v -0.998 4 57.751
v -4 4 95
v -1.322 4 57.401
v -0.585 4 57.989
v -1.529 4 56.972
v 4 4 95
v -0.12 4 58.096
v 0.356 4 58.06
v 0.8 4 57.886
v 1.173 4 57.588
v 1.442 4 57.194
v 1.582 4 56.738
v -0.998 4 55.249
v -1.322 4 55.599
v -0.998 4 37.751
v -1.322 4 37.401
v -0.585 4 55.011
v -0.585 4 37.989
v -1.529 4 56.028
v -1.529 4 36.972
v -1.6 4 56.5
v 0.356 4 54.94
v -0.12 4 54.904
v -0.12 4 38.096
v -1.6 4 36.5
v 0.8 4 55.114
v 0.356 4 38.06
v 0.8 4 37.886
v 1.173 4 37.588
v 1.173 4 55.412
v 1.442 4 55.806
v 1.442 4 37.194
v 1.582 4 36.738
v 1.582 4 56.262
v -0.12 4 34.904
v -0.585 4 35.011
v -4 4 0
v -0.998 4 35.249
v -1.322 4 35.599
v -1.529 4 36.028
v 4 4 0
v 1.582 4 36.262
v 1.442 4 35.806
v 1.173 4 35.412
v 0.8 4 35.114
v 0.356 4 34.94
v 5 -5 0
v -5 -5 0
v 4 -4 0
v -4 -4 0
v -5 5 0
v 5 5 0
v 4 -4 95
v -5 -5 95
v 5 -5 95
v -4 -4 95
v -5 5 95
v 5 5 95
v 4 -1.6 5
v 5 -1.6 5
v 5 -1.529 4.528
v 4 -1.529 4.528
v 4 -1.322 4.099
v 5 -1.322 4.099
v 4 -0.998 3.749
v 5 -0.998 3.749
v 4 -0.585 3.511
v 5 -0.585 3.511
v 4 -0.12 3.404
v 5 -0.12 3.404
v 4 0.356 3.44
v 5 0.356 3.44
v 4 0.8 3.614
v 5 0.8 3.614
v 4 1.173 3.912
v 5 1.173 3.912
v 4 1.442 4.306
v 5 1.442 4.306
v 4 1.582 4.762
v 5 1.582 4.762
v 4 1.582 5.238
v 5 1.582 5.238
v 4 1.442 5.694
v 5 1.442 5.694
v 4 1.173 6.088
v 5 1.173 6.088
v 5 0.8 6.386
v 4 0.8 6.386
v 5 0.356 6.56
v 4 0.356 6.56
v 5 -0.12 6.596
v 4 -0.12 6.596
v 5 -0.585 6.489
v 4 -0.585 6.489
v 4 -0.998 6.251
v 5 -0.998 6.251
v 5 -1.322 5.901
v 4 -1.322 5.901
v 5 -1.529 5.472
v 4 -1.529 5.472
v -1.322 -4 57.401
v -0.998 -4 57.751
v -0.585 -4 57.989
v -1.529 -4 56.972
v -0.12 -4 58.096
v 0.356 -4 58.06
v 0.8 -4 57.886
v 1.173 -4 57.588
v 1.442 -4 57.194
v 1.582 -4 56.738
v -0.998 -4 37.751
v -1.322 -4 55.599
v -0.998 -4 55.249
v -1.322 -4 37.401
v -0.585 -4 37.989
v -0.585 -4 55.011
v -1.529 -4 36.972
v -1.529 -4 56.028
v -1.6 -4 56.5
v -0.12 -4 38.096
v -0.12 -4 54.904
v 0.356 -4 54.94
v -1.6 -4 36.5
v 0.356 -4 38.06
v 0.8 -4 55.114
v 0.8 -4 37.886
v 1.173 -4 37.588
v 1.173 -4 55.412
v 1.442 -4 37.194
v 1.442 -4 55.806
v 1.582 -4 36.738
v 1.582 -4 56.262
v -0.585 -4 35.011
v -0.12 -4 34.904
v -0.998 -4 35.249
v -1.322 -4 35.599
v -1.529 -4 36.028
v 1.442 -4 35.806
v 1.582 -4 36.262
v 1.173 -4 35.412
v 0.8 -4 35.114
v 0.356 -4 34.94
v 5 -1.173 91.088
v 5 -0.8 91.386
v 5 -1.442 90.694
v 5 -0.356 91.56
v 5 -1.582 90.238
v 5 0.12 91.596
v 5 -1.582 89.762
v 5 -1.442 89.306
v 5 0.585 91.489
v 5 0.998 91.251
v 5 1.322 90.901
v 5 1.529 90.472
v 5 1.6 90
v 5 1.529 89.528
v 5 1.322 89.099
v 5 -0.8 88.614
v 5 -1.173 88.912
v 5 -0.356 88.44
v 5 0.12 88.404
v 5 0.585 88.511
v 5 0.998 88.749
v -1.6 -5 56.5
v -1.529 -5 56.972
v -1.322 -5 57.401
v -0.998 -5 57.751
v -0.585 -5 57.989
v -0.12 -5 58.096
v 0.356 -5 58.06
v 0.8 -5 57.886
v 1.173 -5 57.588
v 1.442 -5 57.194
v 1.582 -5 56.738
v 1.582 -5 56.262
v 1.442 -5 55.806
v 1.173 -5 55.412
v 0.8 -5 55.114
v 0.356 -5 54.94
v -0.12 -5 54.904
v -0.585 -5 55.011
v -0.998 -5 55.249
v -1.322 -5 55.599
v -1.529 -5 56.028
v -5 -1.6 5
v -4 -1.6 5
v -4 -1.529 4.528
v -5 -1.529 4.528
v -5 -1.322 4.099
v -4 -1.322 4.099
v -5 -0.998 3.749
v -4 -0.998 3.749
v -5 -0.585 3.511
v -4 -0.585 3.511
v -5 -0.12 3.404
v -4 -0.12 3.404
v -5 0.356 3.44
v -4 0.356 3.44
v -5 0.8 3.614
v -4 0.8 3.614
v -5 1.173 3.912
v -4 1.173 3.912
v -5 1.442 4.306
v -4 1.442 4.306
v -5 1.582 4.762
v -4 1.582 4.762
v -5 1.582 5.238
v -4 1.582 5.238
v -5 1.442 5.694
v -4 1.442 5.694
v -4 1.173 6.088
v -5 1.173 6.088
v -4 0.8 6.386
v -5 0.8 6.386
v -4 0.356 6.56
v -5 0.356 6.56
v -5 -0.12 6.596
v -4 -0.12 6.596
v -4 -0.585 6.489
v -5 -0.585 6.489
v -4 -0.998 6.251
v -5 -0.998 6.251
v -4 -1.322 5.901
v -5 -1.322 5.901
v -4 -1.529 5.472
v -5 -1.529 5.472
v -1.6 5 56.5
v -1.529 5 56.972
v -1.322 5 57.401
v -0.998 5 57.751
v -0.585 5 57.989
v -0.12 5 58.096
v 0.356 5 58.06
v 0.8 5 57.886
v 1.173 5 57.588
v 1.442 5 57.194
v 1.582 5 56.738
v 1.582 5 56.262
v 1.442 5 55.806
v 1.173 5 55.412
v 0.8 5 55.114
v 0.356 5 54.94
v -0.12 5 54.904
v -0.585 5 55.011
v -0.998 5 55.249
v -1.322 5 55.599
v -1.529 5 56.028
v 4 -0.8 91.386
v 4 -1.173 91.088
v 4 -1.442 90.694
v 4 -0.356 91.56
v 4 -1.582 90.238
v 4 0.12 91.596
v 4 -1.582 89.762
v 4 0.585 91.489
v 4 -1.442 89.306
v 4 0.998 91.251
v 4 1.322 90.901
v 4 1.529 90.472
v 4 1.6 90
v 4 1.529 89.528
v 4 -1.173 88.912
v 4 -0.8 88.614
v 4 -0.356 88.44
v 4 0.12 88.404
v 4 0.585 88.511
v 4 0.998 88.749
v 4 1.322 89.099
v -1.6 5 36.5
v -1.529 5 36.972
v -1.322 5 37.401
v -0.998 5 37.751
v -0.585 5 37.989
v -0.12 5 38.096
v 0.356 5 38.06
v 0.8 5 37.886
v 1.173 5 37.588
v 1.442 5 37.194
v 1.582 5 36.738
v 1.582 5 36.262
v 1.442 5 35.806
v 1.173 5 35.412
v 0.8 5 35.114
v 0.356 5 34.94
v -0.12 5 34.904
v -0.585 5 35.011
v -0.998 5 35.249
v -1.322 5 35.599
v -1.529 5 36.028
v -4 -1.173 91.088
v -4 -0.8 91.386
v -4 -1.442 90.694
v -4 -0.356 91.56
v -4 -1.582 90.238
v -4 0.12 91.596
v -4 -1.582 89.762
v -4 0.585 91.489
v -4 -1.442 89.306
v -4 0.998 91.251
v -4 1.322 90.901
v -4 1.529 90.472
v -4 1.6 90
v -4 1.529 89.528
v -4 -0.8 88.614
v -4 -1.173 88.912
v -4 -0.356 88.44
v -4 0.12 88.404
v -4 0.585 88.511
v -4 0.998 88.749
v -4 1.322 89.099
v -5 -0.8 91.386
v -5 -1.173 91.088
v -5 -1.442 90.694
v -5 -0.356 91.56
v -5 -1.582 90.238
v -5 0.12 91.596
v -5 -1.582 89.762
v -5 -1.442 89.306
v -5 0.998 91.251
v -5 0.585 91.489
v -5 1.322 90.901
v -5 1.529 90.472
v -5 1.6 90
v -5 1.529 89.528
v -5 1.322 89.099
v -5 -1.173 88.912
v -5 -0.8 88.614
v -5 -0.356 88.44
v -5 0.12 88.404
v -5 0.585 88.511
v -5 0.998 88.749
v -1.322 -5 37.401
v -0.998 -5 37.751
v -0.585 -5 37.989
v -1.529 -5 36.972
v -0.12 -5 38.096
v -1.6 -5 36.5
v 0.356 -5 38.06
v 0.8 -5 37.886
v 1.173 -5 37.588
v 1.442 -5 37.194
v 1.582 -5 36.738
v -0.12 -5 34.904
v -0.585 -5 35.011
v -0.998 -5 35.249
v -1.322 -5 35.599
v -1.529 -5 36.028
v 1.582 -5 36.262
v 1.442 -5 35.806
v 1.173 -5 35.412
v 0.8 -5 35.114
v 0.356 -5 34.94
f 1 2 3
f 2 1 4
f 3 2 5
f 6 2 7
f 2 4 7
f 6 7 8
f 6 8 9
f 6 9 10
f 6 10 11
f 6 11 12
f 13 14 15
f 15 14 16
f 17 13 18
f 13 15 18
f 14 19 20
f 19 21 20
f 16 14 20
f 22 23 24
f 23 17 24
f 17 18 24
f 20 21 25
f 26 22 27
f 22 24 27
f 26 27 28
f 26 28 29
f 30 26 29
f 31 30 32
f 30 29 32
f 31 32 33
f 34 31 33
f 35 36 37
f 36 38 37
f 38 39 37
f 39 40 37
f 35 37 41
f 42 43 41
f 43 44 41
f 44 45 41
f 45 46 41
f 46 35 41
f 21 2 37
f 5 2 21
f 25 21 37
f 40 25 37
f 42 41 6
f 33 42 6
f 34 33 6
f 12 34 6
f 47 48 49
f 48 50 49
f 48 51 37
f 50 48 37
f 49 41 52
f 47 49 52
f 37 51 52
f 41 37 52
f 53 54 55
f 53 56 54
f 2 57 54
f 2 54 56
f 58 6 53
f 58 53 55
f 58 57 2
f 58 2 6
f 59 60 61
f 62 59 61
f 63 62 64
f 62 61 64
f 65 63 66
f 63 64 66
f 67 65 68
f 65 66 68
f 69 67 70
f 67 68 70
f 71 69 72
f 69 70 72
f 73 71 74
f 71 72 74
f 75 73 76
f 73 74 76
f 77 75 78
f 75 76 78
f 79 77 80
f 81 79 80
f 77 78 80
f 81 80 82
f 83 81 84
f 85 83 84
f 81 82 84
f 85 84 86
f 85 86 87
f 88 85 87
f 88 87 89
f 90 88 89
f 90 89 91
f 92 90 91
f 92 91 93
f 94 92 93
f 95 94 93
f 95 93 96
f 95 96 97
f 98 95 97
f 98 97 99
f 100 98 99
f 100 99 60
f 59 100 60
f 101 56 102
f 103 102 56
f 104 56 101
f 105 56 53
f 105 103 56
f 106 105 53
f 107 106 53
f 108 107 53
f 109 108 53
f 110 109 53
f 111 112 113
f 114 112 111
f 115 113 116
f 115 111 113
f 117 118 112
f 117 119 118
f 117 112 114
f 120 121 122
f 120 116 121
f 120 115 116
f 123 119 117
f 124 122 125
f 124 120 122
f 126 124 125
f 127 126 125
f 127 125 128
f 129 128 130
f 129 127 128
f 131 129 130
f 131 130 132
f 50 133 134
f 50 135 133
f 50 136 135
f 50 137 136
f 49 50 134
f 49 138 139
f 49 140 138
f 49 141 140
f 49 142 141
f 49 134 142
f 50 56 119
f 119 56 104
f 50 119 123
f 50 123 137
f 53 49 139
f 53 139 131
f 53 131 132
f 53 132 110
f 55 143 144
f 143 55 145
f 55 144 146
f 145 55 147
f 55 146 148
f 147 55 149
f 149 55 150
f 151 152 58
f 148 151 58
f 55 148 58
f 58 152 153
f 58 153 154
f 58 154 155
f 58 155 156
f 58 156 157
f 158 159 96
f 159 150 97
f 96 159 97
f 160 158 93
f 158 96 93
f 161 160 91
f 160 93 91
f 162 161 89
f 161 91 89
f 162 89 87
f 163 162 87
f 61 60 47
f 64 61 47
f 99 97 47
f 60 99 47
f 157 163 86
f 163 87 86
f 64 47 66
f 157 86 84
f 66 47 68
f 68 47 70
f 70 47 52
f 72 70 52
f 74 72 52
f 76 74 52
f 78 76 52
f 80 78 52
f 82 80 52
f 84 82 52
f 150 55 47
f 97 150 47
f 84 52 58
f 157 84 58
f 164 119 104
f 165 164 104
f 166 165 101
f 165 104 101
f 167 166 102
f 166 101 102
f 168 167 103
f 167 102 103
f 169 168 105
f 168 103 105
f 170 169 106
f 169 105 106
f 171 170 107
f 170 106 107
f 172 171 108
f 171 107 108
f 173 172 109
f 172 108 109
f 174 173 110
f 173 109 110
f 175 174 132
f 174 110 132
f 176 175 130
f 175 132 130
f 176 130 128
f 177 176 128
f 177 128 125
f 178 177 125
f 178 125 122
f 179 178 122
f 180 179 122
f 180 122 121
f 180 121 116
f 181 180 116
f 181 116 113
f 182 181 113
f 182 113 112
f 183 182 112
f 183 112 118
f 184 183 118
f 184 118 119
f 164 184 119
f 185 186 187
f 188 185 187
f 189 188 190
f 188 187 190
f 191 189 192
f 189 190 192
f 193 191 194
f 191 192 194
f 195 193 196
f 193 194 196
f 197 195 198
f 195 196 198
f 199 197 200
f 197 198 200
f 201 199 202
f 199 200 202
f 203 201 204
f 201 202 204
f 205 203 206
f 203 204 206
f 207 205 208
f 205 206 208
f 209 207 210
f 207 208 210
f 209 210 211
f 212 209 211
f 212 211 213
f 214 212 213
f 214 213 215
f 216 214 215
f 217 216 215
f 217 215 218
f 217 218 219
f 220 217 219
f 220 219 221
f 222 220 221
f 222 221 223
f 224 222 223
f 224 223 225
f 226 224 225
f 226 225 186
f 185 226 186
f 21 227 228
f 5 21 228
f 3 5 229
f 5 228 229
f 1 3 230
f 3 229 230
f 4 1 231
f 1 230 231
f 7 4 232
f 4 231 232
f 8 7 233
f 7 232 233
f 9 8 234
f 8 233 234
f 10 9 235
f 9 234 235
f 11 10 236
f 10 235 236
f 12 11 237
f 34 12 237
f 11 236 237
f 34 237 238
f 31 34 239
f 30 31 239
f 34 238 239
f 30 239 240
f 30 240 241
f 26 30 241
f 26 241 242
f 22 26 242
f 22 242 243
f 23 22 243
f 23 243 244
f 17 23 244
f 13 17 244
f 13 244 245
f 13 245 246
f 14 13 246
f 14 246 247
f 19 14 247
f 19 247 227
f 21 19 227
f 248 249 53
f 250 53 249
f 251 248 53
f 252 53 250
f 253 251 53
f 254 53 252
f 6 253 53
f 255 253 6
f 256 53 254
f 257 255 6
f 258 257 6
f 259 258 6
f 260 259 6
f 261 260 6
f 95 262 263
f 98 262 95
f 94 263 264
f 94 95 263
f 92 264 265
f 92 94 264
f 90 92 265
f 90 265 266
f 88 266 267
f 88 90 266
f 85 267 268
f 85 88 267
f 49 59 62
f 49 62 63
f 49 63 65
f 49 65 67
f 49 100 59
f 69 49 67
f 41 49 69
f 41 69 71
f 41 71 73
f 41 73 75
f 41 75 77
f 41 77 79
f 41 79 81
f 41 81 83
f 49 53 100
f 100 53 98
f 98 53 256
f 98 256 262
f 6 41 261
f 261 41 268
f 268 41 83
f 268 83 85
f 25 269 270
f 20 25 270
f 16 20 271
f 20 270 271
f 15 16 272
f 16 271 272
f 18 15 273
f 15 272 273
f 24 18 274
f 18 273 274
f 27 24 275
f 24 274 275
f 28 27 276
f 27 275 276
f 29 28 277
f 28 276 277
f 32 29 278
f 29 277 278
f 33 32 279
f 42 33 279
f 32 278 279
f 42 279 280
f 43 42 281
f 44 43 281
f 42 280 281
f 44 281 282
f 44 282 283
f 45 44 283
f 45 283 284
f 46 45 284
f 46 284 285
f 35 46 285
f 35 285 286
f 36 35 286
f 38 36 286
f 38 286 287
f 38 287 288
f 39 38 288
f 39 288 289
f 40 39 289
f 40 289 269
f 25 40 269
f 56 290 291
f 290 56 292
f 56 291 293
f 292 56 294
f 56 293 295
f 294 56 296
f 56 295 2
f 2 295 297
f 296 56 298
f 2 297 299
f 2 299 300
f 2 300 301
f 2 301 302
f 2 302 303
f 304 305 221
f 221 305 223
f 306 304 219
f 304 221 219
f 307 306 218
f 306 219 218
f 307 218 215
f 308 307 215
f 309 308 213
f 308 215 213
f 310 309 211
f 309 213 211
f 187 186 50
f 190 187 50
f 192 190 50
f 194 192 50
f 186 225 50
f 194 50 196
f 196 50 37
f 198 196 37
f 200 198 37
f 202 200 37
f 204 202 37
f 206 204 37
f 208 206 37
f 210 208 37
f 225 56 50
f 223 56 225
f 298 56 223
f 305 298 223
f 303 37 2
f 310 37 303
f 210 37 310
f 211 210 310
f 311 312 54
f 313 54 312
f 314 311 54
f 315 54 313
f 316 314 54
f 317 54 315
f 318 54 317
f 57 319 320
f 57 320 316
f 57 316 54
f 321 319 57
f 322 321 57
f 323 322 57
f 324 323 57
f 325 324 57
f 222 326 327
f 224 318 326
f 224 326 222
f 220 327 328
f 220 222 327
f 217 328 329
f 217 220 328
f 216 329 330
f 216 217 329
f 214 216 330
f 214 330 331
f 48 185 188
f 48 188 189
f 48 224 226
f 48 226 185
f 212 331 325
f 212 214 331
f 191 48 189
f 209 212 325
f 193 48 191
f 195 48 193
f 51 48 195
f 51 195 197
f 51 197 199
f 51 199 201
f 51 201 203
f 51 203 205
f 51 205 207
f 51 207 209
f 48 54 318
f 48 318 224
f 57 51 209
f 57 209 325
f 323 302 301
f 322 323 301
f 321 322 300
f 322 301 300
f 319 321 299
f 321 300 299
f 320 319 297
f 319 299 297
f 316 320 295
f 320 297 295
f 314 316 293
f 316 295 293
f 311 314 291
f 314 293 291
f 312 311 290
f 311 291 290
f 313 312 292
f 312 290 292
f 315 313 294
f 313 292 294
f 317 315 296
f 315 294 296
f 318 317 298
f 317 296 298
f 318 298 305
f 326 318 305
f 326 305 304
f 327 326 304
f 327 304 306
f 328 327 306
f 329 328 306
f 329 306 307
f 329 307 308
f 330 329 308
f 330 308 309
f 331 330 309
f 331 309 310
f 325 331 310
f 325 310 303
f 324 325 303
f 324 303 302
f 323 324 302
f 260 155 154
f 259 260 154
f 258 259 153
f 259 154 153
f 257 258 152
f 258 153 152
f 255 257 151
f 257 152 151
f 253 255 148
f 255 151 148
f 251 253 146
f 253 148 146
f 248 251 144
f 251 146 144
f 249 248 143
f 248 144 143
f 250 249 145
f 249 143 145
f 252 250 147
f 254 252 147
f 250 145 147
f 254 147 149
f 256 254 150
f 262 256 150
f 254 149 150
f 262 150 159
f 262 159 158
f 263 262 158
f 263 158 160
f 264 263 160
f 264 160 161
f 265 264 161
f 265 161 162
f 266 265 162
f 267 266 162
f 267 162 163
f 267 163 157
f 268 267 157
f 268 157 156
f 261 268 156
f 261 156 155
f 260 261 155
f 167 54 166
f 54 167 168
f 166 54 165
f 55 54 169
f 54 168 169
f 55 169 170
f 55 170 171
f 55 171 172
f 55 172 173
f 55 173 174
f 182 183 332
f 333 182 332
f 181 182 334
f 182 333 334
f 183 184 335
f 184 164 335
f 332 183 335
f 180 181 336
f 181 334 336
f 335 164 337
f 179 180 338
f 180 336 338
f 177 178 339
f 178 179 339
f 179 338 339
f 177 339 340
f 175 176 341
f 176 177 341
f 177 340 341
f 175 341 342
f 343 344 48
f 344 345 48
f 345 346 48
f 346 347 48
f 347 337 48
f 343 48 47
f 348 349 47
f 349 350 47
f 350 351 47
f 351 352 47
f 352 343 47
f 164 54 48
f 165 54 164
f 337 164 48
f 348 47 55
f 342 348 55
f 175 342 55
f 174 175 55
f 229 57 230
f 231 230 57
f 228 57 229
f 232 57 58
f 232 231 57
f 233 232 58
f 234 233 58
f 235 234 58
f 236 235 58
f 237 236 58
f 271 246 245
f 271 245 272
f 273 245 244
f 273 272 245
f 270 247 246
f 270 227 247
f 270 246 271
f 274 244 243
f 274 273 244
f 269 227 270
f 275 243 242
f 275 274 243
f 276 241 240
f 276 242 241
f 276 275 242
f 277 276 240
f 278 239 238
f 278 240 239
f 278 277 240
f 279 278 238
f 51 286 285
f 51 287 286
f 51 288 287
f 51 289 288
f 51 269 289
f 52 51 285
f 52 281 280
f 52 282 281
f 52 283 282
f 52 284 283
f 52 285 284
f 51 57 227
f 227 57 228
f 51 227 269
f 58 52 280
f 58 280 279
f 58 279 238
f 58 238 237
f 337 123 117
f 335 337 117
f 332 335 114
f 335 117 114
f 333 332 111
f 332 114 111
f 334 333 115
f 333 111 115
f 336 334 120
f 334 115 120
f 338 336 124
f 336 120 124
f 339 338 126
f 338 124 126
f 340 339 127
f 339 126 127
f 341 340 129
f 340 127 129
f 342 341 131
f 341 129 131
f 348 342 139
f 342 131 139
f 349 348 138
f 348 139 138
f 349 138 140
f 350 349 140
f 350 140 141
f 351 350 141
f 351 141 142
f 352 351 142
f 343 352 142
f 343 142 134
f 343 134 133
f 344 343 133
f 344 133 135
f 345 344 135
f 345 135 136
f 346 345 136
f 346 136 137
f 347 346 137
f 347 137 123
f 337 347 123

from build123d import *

# Parameters (mm, degrees)
SKETCH_1_W          = 10
SKETCH_1_H          = 10
SKETCH_1_W_2        = 8
SKETCH_1_H_2        = 8
EXTRUDE_1_DEPTH     = 95
SKETCH_3_R          = 1.6
CUT_EXTRUDE_2_DEPTH = 96.655632349
SKETCH_4_R          = 1.6
CUT_EXTRUDE_3_DEPTH = 96.655632349


with BuildPart() as part:
    # ｽｹｯﾁ1 → 押し出し-薄板1 (new body)
    with BuildSketch(Plane.XY):
        Rectangle(SKETCH_1_W, SKETCH_1_H)
        Rectangle(SKETCH_1_W_2, SKETCH_1_H_2, mode=Mode.SUBTRACT)
    extrude(amount=EXTRUDE_1_DEPTH)

    # ｽｹｯﾁ3 → ｶｯﾄ - 押し出し2 (cut, through all)
    with BuildSketch(Plane(origin=(0, 5, 0), x_dir=(1, 0, 0), z_dir=(0, 1, 0))):
        with Locations(Location((0, -56.5, 0), (0, 0, 180))):
            Circle(SKETCH_3_R)
        with Locations(Location((0, -36.5, 0), (0, 0, 180))):
            Circle(SKETCH_3_R)
    extrude(amount=-CUT_EXTRUDE_2_DEPTH, mode=Mode.SUBTRACT)

    # ｽｹｯﾁ4 → ｶｯﾄ - 押し出し3 (cut, through all)
    with BuildSketch(Plane(origin=(5, 0, 0), x_dir=(0, 0, -1), z_dir=(1, 0, 0))):
        with Locations(Location((-90, 0, 0), (0, 0, 90))):
            Circle(SKETCH_4_R)
        with Locations(Location((-5, 0, 0), (0, 0, 270))):
            Circle(SKETCH_4_R)
    extrude(amount=-CUT_EXTRUDE_3_DEPTH, mode=Mode.SUBTRACT)


solid = part.part
